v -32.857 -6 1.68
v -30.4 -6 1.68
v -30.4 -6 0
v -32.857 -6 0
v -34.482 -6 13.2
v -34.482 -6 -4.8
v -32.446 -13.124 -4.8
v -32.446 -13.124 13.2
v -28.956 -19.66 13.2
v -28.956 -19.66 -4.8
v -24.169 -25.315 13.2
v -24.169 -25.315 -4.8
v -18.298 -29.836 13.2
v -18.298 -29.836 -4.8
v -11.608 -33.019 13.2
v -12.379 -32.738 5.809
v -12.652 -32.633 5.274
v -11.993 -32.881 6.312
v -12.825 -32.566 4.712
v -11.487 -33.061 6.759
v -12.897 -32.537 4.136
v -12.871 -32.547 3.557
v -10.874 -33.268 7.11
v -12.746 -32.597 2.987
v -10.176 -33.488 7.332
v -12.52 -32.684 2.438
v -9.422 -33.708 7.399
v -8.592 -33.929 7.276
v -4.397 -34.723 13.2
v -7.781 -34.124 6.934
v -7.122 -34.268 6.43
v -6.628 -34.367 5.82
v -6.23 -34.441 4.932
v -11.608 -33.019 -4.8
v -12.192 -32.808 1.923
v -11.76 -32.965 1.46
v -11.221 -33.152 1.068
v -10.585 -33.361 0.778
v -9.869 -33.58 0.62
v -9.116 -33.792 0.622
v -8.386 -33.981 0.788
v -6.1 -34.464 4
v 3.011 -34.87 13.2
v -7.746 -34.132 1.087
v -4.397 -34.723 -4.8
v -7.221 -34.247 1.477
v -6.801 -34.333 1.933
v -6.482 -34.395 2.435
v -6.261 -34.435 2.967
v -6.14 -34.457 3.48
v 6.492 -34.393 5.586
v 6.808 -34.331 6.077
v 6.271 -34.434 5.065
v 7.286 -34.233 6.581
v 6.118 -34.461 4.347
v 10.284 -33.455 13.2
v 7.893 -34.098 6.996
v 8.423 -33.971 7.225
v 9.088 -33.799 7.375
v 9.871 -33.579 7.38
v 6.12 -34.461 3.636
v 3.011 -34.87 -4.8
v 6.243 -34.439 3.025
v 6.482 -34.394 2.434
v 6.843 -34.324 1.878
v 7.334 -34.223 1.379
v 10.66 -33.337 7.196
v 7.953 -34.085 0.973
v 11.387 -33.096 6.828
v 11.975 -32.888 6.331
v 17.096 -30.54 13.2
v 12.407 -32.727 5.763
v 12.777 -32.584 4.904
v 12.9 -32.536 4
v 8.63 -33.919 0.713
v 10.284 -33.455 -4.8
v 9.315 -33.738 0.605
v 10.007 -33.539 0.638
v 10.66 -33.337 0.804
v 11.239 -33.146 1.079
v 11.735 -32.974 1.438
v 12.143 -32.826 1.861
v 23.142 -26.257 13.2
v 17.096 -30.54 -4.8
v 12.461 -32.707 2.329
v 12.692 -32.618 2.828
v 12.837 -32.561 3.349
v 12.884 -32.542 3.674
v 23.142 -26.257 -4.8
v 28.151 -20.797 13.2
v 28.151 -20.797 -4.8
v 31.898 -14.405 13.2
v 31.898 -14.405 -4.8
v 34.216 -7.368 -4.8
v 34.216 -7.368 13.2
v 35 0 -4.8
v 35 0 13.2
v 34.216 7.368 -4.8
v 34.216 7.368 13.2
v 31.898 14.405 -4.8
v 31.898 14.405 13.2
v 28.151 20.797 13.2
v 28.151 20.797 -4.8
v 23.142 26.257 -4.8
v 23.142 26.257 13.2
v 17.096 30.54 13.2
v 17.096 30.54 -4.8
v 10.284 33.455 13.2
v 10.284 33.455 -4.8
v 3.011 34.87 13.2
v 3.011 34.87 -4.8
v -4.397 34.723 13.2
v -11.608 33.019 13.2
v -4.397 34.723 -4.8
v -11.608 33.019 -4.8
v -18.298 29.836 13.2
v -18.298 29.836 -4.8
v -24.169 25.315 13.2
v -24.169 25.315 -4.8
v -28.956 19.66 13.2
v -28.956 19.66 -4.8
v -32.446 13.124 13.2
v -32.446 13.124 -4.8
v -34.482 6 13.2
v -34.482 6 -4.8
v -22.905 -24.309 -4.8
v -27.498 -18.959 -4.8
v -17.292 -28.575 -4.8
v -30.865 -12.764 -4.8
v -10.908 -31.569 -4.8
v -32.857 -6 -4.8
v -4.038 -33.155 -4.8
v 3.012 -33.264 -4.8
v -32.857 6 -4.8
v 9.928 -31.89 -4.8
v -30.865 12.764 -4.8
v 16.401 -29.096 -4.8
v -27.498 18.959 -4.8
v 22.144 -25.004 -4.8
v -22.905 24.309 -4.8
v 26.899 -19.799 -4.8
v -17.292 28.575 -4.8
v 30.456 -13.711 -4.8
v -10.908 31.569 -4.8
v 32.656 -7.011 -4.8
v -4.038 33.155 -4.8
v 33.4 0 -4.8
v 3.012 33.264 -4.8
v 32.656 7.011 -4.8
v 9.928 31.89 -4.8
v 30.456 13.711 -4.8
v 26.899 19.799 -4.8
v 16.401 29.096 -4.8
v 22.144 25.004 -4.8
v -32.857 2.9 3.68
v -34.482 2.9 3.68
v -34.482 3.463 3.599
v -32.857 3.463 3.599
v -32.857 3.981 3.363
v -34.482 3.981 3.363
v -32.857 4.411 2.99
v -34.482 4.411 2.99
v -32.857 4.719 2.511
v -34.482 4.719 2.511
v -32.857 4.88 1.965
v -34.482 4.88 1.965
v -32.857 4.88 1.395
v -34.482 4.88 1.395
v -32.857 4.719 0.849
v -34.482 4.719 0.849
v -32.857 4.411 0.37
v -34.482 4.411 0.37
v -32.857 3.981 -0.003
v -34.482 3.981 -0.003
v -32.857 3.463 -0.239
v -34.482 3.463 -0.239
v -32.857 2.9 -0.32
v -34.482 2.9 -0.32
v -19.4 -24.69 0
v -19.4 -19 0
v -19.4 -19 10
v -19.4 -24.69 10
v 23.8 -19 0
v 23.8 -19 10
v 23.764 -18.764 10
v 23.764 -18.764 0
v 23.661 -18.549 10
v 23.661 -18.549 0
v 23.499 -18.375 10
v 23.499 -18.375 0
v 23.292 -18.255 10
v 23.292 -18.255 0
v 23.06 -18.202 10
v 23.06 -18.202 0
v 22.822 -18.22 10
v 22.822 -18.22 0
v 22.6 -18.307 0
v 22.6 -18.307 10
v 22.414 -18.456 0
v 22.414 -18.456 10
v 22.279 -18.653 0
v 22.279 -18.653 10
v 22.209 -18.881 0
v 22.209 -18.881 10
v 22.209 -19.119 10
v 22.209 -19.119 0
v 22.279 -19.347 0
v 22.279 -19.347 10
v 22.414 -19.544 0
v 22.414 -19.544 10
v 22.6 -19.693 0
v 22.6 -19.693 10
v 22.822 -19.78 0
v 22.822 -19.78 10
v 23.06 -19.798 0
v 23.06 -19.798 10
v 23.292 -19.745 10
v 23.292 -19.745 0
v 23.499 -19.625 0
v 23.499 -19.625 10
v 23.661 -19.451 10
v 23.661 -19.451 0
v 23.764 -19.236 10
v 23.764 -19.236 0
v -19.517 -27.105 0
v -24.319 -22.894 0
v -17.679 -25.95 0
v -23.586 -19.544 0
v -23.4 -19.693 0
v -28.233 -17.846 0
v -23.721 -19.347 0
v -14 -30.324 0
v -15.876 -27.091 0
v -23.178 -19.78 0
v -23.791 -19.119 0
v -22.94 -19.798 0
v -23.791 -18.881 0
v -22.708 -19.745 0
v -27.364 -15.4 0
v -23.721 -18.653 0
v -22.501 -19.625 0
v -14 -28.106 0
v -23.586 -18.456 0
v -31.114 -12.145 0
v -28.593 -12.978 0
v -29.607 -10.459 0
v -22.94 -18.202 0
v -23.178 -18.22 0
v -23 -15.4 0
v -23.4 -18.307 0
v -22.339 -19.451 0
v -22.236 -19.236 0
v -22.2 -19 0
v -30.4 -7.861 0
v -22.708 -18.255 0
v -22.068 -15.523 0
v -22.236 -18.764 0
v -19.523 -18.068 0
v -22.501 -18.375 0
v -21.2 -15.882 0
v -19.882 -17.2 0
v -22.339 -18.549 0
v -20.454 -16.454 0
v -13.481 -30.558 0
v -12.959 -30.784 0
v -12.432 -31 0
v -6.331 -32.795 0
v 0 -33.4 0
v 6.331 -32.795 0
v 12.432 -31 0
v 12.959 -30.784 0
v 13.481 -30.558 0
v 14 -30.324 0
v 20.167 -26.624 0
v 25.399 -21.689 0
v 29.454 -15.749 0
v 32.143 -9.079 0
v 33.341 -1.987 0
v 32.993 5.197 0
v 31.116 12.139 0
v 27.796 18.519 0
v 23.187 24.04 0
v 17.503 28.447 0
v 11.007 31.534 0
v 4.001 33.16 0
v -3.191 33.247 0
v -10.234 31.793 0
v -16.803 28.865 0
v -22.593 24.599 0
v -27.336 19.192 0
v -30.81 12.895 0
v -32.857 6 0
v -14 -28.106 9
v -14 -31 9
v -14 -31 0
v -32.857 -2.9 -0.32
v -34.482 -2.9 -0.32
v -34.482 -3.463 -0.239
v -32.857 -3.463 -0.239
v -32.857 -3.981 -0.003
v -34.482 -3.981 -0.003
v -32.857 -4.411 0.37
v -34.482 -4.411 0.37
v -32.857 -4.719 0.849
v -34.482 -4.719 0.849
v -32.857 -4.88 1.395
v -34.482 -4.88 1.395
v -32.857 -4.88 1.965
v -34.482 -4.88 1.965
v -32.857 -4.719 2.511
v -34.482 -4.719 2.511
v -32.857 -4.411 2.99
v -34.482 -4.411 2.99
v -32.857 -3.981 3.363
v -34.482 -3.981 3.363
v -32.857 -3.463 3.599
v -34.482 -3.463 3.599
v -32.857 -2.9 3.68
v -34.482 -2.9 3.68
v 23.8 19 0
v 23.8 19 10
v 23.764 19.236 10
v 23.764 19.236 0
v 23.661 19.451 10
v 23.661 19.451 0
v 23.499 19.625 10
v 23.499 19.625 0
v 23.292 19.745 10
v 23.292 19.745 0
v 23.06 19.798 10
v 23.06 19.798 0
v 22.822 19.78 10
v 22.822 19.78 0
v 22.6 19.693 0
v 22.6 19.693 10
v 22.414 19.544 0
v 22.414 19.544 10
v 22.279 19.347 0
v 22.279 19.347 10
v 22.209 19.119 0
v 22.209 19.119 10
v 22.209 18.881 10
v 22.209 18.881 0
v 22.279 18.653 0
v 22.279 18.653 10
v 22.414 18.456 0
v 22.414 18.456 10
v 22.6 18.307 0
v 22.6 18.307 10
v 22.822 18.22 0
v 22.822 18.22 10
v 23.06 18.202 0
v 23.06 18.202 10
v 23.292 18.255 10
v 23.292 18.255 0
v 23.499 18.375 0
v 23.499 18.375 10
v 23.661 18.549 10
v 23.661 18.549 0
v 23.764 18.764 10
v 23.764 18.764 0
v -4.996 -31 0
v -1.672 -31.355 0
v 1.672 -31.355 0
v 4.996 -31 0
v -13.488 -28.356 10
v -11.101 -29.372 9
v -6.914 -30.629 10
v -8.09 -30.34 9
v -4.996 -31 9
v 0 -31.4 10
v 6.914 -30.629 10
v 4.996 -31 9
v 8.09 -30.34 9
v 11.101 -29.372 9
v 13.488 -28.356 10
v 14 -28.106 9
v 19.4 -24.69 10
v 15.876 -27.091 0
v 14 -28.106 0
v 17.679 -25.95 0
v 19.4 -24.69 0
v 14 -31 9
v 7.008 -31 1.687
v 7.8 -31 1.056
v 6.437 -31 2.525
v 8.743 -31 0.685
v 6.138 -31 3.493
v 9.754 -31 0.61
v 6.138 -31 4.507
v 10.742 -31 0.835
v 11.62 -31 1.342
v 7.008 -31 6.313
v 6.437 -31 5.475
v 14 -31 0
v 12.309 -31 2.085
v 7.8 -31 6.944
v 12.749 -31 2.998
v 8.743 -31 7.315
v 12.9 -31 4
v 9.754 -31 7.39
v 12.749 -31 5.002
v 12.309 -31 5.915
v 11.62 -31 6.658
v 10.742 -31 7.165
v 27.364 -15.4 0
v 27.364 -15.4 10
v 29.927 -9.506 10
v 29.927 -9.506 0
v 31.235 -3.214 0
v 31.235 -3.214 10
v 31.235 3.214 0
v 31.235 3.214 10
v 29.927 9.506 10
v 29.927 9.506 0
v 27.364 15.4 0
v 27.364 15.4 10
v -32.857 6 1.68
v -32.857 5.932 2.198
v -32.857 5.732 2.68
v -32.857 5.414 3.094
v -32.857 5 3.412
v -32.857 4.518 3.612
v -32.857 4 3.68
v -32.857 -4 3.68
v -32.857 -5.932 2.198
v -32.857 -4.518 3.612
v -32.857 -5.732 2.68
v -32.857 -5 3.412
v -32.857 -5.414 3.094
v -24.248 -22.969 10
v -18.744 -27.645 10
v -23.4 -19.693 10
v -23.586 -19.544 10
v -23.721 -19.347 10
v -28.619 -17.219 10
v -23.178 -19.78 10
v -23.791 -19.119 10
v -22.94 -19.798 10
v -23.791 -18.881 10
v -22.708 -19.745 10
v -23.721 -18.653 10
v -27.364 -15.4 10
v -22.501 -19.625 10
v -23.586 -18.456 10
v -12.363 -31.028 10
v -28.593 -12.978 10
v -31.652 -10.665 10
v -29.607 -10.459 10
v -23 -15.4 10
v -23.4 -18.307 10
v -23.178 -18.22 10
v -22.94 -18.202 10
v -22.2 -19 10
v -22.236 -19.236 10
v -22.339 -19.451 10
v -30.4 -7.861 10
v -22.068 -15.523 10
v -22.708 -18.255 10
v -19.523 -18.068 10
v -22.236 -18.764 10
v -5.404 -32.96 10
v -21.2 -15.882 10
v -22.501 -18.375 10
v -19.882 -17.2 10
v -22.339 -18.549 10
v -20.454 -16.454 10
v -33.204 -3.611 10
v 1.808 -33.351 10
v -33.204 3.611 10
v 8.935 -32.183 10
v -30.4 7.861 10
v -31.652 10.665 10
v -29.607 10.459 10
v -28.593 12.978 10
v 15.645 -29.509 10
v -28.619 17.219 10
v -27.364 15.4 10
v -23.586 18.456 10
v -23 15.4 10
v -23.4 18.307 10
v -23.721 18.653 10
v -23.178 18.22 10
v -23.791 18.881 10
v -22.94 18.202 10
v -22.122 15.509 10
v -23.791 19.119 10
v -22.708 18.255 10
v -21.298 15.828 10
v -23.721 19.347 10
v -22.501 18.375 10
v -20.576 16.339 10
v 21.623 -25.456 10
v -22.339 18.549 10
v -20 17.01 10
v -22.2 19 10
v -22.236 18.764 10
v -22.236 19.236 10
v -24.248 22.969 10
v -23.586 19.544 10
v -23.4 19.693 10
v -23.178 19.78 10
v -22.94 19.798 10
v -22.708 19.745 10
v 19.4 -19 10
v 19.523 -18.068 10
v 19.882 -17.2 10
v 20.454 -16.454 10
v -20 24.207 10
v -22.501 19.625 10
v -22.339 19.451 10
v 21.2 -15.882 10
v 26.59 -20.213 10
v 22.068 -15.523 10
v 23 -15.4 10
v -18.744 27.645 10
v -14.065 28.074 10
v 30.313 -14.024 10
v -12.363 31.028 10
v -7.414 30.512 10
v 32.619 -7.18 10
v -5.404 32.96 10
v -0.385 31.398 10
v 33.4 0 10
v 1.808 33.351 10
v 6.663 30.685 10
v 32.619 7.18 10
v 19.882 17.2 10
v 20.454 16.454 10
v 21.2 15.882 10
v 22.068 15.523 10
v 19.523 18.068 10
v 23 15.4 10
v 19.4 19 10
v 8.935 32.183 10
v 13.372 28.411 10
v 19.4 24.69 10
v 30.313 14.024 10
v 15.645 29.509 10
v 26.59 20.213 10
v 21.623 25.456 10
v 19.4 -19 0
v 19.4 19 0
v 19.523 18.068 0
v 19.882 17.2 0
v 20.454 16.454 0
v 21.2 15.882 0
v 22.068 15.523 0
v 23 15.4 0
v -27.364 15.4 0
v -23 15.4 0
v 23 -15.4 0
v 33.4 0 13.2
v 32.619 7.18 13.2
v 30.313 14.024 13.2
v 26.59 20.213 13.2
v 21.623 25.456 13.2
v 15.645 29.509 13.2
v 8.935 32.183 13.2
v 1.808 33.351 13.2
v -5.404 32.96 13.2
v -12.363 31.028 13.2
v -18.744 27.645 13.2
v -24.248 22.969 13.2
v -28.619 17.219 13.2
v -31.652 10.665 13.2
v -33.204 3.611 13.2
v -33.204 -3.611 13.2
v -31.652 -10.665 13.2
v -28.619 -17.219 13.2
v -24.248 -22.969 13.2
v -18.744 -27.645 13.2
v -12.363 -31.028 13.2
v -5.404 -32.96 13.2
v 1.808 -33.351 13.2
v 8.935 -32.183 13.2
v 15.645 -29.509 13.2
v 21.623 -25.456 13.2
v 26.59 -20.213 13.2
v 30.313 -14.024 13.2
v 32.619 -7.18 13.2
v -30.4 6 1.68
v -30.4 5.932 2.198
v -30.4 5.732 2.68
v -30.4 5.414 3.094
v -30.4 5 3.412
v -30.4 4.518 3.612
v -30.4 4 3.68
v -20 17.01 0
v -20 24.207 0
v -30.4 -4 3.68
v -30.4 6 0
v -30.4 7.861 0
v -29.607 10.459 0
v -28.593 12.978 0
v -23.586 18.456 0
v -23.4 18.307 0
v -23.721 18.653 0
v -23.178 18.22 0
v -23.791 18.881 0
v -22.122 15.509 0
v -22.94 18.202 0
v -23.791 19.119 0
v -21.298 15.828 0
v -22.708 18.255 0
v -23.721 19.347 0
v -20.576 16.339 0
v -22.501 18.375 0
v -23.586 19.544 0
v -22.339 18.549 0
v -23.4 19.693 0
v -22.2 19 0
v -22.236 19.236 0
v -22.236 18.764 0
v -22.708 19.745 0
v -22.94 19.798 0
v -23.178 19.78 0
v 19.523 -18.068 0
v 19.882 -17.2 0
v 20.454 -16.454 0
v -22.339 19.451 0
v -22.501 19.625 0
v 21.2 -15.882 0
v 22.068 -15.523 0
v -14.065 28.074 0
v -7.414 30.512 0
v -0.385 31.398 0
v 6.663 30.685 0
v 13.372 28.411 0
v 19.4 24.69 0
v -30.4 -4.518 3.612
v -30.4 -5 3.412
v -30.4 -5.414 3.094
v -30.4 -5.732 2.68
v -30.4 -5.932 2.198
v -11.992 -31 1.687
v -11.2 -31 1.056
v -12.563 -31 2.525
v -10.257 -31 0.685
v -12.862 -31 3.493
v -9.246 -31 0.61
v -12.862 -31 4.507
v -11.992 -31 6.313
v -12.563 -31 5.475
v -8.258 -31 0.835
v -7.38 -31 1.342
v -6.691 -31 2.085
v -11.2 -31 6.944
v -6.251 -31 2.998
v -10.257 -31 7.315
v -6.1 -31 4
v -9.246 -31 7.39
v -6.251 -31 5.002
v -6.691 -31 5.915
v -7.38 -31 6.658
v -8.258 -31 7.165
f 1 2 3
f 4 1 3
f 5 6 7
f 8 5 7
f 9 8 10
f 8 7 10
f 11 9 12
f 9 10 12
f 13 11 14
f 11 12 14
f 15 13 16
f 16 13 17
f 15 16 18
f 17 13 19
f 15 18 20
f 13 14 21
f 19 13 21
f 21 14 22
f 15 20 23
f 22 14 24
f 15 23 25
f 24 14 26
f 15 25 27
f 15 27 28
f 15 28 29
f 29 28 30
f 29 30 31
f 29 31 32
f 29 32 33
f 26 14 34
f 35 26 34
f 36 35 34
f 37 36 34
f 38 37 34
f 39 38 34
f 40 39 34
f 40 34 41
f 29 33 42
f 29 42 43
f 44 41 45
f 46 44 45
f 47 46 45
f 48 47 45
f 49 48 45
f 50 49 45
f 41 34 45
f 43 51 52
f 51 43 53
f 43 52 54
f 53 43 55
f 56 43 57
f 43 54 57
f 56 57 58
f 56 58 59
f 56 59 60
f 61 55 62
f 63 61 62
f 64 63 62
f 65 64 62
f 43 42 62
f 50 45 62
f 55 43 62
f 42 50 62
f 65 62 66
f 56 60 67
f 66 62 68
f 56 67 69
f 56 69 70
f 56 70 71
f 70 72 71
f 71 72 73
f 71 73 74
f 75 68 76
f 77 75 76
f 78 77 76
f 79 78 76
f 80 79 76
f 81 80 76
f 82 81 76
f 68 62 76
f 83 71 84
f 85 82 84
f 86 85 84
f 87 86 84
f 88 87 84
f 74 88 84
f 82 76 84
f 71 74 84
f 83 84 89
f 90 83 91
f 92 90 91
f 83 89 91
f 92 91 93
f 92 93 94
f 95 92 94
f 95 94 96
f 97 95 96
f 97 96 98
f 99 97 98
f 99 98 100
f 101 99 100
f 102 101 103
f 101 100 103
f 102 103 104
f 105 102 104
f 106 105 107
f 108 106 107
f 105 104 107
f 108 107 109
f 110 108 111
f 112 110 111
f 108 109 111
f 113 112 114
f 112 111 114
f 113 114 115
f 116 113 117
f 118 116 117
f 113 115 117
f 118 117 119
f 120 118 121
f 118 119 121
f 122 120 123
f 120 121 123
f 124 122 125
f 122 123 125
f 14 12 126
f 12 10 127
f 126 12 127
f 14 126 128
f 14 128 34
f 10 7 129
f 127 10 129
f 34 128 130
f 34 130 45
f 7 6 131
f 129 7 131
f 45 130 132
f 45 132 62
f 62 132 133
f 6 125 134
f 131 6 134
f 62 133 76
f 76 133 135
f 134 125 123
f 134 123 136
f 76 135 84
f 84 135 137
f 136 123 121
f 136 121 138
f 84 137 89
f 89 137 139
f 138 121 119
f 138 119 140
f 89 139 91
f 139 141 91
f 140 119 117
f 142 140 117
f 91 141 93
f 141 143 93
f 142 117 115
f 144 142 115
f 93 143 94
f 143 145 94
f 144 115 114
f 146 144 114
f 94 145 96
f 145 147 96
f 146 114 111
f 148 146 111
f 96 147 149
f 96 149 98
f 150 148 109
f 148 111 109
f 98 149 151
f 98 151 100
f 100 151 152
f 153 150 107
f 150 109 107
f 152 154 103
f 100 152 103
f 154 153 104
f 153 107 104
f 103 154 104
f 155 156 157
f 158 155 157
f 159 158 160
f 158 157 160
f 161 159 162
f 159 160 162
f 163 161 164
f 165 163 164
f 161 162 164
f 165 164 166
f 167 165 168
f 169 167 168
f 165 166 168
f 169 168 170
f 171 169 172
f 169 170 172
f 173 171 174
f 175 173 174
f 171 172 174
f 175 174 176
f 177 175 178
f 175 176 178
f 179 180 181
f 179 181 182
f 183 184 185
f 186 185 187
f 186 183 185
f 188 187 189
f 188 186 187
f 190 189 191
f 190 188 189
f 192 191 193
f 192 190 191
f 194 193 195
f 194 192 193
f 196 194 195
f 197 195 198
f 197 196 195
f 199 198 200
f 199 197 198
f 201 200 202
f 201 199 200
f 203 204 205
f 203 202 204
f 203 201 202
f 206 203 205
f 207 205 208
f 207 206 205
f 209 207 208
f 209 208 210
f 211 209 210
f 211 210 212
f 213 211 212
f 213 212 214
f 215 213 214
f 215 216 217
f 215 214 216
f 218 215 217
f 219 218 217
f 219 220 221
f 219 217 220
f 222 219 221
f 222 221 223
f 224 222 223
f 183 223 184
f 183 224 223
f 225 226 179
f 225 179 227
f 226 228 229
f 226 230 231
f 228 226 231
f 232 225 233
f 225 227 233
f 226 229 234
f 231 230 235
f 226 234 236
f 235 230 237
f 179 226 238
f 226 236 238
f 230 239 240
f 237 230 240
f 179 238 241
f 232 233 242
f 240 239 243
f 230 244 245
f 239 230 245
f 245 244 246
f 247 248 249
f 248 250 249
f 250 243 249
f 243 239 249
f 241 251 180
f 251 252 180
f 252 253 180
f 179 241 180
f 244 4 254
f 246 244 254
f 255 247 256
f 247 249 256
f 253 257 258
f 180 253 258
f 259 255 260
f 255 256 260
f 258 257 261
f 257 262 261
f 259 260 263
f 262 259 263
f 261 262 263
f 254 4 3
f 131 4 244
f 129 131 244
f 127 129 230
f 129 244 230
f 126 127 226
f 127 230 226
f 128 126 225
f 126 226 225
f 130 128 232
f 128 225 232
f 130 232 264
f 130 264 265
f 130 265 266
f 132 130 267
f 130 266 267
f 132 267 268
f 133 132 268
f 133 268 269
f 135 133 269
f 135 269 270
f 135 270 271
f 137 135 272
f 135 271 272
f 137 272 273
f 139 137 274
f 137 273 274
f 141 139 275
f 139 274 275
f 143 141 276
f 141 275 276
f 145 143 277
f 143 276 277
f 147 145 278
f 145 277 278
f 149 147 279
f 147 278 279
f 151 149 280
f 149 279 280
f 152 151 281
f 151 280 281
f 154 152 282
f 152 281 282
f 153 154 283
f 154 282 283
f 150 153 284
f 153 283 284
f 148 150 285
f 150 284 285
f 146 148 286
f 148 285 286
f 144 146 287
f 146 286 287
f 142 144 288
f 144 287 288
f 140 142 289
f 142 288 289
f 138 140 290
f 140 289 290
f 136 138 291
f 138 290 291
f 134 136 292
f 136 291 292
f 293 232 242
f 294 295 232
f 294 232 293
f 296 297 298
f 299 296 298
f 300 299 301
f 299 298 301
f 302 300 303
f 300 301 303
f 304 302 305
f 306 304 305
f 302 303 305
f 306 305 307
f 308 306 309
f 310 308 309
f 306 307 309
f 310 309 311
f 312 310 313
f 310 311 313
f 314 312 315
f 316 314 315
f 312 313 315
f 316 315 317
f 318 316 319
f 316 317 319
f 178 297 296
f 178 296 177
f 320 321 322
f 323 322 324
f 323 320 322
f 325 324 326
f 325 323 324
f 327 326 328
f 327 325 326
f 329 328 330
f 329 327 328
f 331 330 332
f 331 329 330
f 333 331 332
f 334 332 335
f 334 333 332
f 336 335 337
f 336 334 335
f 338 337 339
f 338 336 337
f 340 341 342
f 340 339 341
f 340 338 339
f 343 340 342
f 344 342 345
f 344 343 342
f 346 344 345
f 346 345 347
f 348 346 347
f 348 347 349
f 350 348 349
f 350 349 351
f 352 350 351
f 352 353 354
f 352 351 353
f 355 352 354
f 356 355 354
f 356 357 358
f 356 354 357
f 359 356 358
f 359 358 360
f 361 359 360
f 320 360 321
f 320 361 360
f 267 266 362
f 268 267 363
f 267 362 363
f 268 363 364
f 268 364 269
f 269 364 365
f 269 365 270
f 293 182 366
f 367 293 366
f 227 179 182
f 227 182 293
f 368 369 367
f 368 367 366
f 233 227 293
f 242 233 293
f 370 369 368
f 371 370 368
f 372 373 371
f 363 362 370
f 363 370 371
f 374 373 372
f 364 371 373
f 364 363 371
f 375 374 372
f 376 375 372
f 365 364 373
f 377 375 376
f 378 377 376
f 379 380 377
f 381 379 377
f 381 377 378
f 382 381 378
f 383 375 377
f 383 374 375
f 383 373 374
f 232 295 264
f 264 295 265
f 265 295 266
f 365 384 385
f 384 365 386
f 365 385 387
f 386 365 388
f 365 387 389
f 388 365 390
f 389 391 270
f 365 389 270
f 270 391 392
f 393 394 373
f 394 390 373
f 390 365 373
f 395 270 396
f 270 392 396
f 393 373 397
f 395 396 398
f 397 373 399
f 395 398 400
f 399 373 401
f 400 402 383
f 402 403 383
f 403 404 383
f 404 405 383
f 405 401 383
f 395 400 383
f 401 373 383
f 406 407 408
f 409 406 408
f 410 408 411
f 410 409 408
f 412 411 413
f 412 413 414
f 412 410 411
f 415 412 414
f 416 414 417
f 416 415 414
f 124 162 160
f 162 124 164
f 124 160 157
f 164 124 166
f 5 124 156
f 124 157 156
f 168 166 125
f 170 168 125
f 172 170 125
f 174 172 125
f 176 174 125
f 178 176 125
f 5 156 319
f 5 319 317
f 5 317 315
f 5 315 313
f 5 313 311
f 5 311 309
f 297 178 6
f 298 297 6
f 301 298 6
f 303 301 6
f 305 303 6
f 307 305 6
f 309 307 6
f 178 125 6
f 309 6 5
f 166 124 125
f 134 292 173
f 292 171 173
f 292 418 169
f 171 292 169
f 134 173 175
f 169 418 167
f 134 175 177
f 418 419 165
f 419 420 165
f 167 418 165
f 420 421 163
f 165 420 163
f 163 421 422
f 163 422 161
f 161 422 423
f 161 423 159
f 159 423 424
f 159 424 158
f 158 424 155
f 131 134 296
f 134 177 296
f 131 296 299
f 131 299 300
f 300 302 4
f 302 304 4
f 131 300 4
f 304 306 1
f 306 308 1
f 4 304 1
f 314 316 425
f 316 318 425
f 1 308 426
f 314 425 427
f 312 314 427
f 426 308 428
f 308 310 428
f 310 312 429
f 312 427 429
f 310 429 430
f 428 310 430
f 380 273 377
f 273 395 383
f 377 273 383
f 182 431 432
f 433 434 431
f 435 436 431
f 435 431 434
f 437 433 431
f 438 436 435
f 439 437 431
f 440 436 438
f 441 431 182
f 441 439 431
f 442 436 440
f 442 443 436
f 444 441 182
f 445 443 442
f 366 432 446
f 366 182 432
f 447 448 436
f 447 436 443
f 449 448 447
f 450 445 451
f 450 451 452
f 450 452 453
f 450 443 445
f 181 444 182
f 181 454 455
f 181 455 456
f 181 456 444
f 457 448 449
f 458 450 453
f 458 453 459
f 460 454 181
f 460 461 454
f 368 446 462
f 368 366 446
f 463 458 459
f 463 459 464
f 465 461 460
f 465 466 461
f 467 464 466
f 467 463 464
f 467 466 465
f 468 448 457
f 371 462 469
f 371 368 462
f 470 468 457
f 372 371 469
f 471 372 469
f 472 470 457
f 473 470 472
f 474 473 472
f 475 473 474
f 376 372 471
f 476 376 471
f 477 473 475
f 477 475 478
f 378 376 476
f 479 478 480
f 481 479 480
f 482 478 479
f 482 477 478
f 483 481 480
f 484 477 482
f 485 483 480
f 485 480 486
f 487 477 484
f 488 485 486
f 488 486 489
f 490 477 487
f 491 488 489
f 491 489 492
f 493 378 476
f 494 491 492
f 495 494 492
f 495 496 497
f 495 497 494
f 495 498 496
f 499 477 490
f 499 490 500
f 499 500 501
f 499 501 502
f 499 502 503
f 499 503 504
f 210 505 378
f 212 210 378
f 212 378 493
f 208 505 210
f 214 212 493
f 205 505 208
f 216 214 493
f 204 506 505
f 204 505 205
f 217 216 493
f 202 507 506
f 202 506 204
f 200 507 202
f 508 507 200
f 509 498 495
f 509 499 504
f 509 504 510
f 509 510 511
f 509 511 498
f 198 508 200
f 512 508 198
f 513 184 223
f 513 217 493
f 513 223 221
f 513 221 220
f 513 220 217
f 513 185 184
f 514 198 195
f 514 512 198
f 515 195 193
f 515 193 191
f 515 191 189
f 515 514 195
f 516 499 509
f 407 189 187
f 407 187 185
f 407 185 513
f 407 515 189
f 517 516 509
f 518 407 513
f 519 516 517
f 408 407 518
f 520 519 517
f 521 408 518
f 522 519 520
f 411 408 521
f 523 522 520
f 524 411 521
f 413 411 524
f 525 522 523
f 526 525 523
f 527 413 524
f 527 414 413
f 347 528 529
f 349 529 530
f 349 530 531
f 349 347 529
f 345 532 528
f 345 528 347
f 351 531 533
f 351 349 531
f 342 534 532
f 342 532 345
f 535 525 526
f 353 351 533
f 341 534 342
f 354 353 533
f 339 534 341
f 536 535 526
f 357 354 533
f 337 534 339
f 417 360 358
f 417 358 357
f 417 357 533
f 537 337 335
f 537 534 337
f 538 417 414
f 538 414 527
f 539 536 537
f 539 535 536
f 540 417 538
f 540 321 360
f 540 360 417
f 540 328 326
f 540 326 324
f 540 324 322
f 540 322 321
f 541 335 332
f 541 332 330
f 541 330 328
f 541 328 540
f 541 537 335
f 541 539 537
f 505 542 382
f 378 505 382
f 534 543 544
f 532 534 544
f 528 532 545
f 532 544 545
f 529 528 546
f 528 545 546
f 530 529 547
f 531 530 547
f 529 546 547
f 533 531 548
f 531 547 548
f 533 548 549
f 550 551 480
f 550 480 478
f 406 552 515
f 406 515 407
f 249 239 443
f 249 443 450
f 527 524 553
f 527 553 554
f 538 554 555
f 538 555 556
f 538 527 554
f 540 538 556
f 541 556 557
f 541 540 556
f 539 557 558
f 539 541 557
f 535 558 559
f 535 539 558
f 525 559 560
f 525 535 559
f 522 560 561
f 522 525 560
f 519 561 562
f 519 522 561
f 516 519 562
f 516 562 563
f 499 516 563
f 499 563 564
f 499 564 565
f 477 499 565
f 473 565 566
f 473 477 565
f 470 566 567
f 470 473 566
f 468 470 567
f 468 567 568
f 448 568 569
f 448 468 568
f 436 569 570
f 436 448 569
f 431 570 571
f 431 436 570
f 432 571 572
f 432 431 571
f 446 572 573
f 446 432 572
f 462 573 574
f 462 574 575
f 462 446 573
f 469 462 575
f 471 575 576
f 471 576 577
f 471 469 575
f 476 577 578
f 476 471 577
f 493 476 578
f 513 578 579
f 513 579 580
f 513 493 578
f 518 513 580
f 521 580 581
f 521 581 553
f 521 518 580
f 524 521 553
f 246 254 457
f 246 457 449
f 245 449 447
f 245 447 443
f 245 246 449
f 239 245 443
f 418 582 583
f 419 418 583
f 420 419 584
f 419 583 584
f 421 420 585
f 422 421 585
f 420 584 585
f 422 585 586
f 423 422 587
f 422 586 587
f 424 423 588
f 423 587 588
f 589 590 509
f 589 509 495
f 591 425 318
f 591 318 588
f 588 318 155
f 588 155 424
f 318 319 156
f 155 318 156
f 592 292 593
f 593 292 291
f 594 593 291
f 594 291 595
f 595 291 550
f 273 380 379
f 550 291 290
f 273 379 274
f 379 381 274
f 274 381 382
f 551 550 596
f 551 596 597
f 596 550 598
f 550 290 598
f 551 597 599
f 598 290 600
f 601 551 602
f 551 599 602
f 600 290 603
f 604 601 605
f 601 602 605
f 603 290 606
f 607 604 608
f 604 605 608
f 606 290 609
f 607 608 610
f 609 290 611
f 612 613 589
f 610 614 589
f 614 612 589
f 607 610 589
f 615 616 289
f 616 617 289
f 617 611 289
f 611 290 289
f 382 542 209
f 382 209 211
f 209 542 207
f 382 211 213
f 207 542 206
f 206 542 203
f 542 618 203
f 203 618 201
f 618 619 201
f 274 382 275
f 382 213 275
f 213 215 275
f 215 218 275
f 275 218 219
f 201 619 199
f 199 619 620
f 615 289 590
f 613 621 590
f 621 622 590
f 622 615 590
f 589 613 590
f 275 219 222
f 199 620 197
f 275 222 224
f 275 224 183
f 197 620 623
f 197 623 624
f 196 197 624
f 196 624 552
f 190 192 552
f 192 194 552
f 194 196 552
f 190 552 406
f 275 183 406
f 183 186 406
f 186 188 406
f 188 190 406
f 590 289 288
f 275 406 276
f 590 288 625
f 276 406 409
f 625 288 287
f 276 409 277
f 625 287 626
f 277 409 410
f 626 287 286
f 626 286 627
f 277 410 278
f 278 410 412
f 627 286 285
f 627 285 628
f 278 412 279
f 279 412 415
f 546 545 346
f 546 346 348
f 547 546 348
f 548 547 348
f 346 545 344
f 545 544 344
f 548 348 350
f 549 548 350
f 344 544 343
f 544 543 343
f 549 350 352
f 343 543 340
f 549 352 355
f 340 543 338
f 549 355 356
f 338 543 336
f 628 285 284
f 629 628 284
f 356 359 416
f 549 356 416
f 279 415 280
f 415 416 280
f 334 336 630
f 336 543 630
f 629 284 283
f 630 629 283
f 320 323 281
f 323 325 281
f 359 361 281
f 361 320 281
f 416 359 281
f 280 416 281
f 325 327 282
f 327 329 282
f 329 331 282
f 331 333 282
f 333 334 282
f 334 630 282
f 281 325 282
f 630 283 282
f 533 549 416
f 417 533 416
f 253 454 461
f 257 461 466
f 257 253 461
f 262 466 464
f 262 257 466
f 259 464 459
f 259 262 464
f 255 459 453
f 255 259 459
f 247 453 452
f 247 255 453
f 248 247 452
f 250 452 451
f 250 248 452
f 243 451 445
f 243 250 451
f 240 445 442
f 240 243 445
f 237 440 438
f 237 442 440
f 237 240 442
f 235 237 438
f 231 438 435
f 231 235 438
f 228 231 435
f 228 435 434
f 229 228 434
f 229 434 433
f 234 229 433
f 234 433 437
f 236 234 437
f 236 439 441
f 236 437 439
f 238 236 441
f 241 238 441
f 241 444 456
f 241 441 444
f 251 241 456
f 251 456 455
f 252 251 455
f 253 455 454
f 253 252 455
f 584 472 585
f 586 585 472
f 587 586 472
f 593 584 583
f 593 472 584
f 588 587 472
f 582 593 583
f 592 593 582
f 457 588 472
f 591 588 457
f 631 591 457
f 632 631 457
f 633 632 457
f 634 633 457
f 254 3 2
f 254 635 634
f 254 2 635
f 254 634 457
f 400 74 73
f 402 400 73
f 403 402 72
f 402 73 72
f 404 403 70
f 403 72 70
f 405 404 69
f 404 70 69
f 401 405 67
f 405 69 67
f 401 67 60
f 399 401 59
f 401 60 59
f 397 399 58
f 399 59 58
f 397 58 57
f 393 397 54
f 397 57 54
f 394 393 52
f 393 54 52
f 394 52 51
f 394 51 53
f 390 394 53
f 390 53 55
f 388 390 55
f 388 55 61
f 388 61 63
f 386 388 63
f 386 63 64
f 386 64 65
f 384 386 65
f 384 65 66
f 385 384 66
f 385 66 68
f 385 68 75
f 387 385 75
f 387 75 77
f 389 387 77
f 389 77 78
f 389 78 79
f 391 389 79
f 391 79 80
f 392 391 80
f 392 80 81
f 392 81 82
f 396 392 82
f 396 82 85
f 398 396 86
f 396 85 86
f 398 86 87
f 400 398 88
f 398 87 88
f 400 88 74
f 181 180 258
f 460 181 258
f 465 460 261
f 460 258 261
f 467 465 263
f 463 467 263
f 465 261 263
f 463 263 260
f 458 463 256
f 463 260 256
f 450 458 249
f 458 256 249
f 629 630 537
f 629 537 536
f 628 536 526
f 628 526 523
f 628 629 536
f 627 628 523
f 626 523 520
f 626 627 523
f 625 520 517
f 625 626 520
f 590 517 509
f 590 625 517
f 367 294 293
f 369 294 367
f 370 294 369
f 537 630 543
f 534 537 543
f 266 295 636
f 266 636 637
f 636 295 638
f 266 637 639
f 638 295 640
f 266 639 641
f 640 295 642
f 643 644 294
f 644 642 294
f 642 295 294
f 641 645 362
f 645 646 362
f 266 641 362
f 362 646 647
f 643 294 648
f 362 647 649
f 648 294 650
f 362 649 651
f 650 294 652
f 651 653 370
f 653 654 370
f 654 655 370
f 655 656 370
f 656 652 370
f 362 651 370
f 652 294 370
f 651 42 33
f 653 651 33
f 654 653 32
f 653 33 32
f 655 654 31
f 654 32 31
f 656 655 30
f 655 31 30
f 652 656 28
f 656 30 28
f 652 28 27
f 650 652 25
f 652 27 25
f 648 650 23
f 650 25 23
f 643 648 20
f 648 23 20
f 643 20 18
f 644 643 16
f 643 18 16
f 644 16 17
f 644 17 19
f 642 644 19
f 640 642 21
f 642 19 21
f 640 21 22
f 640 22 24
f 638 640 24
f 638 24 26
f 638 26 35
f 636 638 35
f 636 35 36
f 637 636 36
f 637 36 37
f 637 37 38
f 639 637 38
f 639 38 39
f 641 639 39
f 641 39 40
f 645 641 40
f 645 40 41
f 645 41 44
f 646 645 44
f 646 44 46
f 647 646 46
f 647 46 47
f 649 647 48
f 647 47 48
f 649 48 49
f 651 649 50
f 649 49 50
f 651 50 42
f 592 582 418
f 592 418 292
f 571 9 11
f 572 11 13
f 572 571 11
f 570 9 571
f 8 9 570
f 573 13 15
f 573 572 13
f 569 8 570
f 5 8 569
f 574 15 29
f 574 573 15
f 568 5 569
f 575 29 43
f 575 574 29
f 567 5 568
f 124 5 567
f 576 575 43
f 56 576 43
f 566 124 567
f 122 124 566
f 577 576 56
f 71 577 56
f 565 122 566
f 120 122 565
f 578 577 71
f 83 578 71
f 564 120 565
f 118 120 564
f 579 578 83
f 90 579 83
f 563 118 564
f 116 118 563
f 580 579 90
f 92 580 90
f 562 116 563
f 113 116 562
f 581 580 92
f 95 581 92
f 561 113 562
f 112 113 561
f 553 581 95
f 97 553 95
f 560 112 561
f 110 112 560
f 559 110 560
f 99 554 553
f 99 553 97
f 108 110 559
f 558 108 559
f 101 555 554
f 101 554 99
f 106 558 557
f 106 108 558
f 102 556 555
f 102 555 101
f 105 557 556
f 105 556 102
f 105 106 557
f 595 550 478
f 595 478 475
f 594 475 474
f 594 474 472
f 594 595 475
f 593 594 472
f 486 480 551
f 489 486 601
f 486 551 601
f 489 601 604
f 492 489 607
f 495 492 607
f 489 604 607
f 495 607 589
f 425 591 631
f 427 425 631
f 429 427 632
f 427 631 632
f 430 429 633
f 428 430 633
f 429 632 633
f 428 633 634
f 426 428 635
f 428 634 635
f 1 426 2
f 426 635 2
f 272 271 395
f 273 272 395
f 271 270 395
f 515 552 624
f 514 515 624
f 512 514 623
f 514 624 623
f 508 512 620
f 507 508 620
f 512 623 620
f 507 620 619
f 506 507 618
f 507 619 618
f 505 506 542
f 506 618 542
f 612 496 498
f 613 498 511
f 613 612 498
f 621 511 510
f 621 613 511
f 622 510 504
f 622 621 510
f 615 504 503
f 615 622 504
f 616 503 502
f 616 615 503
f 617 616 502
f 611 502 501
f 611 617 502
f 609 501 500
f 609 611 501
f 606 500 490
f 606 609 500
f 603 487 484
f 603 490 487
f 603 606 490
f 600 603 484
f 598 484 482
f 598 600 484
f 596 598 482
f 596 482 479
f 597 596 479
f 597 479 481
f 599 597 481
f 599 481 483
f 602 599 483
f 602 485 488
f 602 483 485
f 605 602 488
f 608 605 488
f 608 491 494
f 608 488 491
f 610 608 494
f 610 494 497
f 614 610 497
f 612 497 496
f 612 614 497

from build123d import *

# Parameters (mm, degrees)
PAD011_DEPTH    = 10
PAD012_DEPTH    = 4.8
SKETCH024_R     = 33.4
PAD013_DEPTH    = 3.2
POCKET007_DEPTH = 2.456658
POCKET008_DEPTH = 1.625221
SKETCH023_W     = 28
SKETCH023_H     = 9
POCKET009_DEPTH = 5
SKETCH022_R     = 3.4
POCKET010_DEPTH = 5
SKETCH025_R     = 0.8
POCKET011_DEPTH = 13.201


with BuildPart() as part:
    # CopySketch013 → Pad011 (new body)
    with BuildSketch(Plane.XY):
        with BuildLine():
            ThreePointArc((-34.481879, -6), (35, 0), (-34.481879, 6))
            Line((-34.481879, 6), (-34.481879, -6))
        make_face()
        with BuildLine():
            ThreePointArc((-27.36421, 15.4), (-29.127032, 11.729279), (-30.4, 7.861298))
            Line((-30.4, 7.861298), (-30.4, -7.861298))
            ThreePointArc((-30.4, -7.861298), (-29.127032, -11.729279), (-27.36421, -15.4))
            Line((-27.36421, -15.4), (-23, -15.4))
            ThreePointArc((-19.4, -18.999985), (-20.454421, -16.45441), (-23, -15.4))
            Line((-19.4, -18.999985), (-19.4, -24.690079))
            ThreePointArc((-19.4, -24.690079), (0, -31.4), (19.4, -24.690079))
            Line((19.4, -19), (19.4, -24.690079))
            ThreePointArc((23, -15.4), (20.454416, -16.454416), (19.4, -19))
            Line((23, -15.4), (27.36421, -15.4))
            ThreePointArc((27.36421, -15.4), (31.4, 0), (27.36421, 15.4))
            Line((23, 15.4), (27.36421, 15.4))
            ThreePointArc((19.4, 19), (20.454416, 16.454416), (23, 15.4))
            Line((19.4, 24.690079), (19.4, 19))
            ThreePointArc((19.4, 24.690079), (-0.385273, 31.397636), (-20, 24.206611))
            Line((-20, 24.206611), (-20, 17.010025))
            ThreePointArc((-23, 15.4), (-21.297635, 15.827942), (-20, 17.010025))
            Line((-23, 15.4), (-27.36421, 15.4))
        make_face(mode=Mode.SUBTRACT)
    extrude(amount=PAD011_DEPTH)

    # Sketch019 → Pad012 (join)
    with BuildSketch(Plane.XY):
        with BuildLine():
            ThreePointArc((-34.481879, -6), (35, 0), (-34.481879, 6))
            Line((-34.481879, 6), (-34.481879, -6))
        make_face()
        with BuildLine():
            ThreePointArc((-32.856658, -6), (33.4, 0), (-32.856658, 6))
            Line((-32.856658, 6), (-32.856658, -6))
        make_face(mode=Mode.SUBTRACT)
    extrude(amount=-PAD012_DEPTH)

    # Sketch024 → Pad013 (join)
    with BuildSketch(Plane.XY.offset(10)):
        with BuildLine():
            ThreePointArc((-34.481879, -6), (35, 0), (-34.481879, 6))
            Line((-34.481879, 6), (-34.481879, -6))
        make_face()
        Circle(SKETCH024_R, mode=Mode.SUBTRACT)
    extrude(amount=PAD013_DEPTH)

    # Sketch020 (on Face19 of Pad013) → Pocket007 (cut)
    with BuildSketch(Plane.YZ.offset(-30.4)):
        with BuildLine():
            ThreePointArc((-4, 3.68), (-5.414214, 3.094214), (-6, 1.68))
            Line((-6, 1.68), (-6, -3.6))
            Line((-6, -3.6), (6, -3.6))
            Line((6, 1.68), (6, -3.6))
            ThreePointArc((6, 1.68), (5.414214, 3.094214), (4, 3.68))
            Line((-4, 3.68), (4, 3.68))
        make_face()
    extrude(amount=-POCKET007_DEPTH, mode=Mode.SUBTRACT)

    # Sketch021 → Pocket008 (cut)
    with BuildSketch(Plane(origin=(-34.481879, 0, 0), x_dir=(0, -1, 0), z_dir=(-1, 0, 0))):
        with BuildLine():
            ThreePointArc((2.9, -0.32), (4.9, 1.68), (2.9, 3.68))
            Line((2.9, 3.68), (-2.9, 3.68))
            ThreePointArc((-2.9, 3.68), (-4.9, 1.68), (-2.9, -0.32))
            Line((2.9, -0.32), (-2.9, -0.32))
        make_face()
    extrude(amount=-POCKET008_DEPTH, mode=Mode.SUBTRACT)

    # Sketch023 → Pocket009 (cut)
    with BuildSketch(Plane.XZ.offset(31)):
        with Locations((0, 4.5)):
            Rectangle(SKETCH023_W, SKETCH023_H)
    extrude(amount=-POCKET009_DEPTH, mode=Mode.SUBTRACT)

    # Sketch022 → Pocket010 (cut)
    with BuildSketch(Plane.XZ.offset(35)):
        with Locations((-9.5, 4)):
            Circle(SKETCH022_R)
        with Locations((9.5, 4)):
            Circle(SKETCH022_R)
    extrude(amount=-POCKET010_DEPTH, mode=Mode.SUBTRACT)

    # Sketch025 → Pocket011 (cut, through all)
    with BuildSketch(Plane.XY):
        with Locations((-23, 19)):
            Circle(SKETCH025_R)
        with Locations((23, 19)):
            Circle(SKETCH025_R)
        with Locations((-23, -19)):
            Circle(SKETCH025_R)
        with Locations((23, -19)):
            Circle(SKETCH025_R)
    extrude(amount=POCKET011_DEPTH, mode=Mode.SUBTRACT)


solid = part.part
